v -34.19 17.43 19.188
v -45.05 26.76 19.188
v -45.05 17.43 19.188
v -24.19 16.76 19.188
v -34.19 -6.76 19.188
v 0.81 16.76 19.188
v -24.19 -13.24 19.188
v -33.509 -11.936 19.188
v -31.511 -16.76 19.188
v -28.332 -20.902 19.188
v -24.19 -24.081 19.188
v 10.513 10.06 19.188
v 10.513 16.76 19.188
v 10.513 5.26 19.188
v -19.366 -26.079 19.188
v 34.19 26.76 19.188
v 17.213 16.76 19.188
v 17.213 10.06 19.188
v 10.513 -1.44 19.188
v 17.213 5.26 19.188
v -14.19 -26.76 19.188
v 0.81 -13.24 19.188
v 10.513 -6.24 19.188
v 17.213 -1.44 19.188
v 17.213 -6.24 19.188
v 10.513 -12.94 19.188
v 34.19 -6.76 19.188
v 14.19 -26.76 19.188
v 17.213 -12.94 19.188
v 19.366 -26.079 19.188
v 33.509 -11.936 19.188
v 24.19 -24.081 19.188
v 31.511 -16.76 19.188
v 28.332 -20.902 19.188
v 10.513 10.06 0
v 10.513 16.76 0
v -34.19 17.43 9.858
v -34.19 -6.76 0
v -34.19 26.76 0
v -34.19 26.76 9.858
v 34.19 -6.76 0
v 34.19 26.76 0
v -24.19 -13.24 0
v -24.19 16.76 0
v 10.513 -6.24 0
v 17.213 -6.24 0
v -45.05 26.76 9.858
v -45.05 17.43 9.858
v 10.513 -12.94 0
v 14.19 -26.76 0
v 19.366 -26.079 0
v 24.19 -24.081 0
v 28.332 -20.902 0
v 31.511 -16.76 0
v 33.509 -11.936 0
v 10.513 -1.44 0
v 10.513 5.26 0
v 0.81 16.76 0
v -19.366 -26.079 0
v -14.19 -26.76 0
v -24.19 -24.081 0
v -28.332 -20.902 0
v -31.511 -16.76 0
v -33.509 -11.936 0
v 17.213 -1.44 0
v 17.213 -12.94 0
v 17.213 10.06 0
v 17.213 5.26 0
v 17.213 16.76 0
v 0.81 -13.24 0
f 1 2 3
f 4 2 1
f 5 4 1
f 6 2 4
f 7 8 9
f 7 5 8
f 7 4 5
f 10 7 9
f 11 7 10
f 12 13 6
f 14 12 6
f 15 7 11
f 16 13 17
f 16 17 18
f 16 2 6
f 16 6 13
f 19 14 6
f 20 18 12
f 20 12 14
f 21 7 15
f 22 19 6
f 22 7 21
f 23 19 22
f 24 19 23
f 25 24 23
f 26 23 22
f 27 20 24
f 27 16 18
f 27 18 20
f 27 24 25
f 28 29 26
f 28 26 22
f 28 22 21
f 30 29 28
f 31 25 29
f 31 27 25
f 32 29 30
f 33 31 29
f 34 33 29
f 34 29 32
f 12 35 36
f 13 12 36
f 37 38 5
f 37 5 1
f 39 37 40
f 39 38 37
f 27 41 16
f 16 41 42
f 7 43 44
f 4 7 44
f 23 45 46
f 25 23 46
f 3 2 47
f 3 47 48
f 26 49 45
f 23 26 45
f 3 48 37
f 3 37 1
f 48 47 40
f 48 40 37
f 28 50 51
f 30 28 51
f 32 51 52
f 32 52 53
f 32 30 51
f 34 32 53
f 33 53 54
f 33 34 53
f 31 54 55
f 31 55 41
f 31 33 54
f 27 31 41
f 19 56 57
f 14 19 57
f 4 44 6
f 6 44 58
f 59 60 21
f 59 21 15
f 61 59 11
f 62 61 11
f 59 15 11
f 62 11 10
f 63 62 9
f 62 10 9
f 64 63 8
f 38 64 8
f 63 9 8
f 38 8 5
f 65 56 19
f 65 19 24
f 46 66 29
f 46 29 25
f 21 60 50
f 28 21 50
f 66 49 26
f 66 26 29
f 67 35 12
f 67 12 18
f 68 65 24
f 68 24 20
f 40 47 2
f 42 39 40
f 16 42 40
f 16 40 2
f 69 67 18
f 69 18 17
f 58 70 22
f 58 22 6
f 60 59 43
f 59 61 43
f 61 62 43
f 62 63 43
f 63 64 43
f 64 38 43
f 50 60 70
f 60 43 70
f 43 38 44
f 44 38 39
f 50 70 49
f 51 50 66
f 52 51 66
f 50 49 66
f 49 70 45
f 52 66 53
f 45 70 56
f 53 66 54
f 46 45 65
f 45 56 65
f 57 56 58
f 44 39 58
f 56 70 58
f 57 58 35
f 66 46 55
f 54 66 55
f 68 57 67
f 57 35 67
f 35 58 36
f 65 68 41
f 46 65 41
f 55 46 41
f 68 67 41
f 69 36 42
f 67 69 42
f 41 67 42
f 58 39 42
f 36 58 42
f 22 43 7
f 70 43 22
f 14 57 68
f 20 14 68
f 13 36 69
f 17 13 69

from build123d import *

# Parameters (mm, degrees)
F0_W     = 68.38
F0_H     = 53.52
F1_DEPTH = 19.18835
F2_W     = 9.33
F2_H     = 9.33
F3_DEPTH = 10.86
F4_R     = 20
F5_R     = 20
F7_W     = 25
F7_H     = 30
F7_W_2   = 6.7
F7_H_2   = 6.7
F8_DEPTH = 29.55052


with BuildPart() as f1:
    # F0 (on Top) → F1 (new body)
    with BuildSketch(Plane.XY):
        Rectangle(F0_W, F0_H)
    extrude(amount=F1_DEPTH)

    # F2 (on face) → F3 (join)
    with BuildSketch(Plane(origin=(-34.19, 0, 0), x_dir=(0, -1, 0), z_dir=(-1, 0, 0))):
        with Locations((-22.095, 14.52335)):
            Rectangle(F2_W, F2_H)
    extrude(amount=F3_DEPTH)

    # F4
    f4_edges = [f1.edges().sort_by_distance(p)[0] for p in [
        (34.19, -26.76, 9.594175),
    ]]
    fillet(f4_edges, radius=F4_R)

    # F5
    f5_edges = [f1.edges().sort_by_distance(p)[0] for p in [
        (-34.19, -26.76, 9.594175),
    ]]
    fillet(f5_edges, radius=F5_R)

    # F7 (on face) → F8 (cut)
    with BuildSketch(Plane.XY):
        with Locations((-11.69, 1.76)):
            Rectangle(F7_W, F7_H)
        with Locations((13.863151, 13.41)):
            Rectangle(F7_W_2, F7_H_2)
        with Locations((13.863151, 1.91)):
            Rectangle(F7_W_2, F7_H_2)
        with Locations((13.863151, -9.59)):
            Rectangle(F7_W_2, F7_H_2)
    extrude(amount=F8_DEPTH, mode=Mode.SUBTRACT)


solid = f1.part
